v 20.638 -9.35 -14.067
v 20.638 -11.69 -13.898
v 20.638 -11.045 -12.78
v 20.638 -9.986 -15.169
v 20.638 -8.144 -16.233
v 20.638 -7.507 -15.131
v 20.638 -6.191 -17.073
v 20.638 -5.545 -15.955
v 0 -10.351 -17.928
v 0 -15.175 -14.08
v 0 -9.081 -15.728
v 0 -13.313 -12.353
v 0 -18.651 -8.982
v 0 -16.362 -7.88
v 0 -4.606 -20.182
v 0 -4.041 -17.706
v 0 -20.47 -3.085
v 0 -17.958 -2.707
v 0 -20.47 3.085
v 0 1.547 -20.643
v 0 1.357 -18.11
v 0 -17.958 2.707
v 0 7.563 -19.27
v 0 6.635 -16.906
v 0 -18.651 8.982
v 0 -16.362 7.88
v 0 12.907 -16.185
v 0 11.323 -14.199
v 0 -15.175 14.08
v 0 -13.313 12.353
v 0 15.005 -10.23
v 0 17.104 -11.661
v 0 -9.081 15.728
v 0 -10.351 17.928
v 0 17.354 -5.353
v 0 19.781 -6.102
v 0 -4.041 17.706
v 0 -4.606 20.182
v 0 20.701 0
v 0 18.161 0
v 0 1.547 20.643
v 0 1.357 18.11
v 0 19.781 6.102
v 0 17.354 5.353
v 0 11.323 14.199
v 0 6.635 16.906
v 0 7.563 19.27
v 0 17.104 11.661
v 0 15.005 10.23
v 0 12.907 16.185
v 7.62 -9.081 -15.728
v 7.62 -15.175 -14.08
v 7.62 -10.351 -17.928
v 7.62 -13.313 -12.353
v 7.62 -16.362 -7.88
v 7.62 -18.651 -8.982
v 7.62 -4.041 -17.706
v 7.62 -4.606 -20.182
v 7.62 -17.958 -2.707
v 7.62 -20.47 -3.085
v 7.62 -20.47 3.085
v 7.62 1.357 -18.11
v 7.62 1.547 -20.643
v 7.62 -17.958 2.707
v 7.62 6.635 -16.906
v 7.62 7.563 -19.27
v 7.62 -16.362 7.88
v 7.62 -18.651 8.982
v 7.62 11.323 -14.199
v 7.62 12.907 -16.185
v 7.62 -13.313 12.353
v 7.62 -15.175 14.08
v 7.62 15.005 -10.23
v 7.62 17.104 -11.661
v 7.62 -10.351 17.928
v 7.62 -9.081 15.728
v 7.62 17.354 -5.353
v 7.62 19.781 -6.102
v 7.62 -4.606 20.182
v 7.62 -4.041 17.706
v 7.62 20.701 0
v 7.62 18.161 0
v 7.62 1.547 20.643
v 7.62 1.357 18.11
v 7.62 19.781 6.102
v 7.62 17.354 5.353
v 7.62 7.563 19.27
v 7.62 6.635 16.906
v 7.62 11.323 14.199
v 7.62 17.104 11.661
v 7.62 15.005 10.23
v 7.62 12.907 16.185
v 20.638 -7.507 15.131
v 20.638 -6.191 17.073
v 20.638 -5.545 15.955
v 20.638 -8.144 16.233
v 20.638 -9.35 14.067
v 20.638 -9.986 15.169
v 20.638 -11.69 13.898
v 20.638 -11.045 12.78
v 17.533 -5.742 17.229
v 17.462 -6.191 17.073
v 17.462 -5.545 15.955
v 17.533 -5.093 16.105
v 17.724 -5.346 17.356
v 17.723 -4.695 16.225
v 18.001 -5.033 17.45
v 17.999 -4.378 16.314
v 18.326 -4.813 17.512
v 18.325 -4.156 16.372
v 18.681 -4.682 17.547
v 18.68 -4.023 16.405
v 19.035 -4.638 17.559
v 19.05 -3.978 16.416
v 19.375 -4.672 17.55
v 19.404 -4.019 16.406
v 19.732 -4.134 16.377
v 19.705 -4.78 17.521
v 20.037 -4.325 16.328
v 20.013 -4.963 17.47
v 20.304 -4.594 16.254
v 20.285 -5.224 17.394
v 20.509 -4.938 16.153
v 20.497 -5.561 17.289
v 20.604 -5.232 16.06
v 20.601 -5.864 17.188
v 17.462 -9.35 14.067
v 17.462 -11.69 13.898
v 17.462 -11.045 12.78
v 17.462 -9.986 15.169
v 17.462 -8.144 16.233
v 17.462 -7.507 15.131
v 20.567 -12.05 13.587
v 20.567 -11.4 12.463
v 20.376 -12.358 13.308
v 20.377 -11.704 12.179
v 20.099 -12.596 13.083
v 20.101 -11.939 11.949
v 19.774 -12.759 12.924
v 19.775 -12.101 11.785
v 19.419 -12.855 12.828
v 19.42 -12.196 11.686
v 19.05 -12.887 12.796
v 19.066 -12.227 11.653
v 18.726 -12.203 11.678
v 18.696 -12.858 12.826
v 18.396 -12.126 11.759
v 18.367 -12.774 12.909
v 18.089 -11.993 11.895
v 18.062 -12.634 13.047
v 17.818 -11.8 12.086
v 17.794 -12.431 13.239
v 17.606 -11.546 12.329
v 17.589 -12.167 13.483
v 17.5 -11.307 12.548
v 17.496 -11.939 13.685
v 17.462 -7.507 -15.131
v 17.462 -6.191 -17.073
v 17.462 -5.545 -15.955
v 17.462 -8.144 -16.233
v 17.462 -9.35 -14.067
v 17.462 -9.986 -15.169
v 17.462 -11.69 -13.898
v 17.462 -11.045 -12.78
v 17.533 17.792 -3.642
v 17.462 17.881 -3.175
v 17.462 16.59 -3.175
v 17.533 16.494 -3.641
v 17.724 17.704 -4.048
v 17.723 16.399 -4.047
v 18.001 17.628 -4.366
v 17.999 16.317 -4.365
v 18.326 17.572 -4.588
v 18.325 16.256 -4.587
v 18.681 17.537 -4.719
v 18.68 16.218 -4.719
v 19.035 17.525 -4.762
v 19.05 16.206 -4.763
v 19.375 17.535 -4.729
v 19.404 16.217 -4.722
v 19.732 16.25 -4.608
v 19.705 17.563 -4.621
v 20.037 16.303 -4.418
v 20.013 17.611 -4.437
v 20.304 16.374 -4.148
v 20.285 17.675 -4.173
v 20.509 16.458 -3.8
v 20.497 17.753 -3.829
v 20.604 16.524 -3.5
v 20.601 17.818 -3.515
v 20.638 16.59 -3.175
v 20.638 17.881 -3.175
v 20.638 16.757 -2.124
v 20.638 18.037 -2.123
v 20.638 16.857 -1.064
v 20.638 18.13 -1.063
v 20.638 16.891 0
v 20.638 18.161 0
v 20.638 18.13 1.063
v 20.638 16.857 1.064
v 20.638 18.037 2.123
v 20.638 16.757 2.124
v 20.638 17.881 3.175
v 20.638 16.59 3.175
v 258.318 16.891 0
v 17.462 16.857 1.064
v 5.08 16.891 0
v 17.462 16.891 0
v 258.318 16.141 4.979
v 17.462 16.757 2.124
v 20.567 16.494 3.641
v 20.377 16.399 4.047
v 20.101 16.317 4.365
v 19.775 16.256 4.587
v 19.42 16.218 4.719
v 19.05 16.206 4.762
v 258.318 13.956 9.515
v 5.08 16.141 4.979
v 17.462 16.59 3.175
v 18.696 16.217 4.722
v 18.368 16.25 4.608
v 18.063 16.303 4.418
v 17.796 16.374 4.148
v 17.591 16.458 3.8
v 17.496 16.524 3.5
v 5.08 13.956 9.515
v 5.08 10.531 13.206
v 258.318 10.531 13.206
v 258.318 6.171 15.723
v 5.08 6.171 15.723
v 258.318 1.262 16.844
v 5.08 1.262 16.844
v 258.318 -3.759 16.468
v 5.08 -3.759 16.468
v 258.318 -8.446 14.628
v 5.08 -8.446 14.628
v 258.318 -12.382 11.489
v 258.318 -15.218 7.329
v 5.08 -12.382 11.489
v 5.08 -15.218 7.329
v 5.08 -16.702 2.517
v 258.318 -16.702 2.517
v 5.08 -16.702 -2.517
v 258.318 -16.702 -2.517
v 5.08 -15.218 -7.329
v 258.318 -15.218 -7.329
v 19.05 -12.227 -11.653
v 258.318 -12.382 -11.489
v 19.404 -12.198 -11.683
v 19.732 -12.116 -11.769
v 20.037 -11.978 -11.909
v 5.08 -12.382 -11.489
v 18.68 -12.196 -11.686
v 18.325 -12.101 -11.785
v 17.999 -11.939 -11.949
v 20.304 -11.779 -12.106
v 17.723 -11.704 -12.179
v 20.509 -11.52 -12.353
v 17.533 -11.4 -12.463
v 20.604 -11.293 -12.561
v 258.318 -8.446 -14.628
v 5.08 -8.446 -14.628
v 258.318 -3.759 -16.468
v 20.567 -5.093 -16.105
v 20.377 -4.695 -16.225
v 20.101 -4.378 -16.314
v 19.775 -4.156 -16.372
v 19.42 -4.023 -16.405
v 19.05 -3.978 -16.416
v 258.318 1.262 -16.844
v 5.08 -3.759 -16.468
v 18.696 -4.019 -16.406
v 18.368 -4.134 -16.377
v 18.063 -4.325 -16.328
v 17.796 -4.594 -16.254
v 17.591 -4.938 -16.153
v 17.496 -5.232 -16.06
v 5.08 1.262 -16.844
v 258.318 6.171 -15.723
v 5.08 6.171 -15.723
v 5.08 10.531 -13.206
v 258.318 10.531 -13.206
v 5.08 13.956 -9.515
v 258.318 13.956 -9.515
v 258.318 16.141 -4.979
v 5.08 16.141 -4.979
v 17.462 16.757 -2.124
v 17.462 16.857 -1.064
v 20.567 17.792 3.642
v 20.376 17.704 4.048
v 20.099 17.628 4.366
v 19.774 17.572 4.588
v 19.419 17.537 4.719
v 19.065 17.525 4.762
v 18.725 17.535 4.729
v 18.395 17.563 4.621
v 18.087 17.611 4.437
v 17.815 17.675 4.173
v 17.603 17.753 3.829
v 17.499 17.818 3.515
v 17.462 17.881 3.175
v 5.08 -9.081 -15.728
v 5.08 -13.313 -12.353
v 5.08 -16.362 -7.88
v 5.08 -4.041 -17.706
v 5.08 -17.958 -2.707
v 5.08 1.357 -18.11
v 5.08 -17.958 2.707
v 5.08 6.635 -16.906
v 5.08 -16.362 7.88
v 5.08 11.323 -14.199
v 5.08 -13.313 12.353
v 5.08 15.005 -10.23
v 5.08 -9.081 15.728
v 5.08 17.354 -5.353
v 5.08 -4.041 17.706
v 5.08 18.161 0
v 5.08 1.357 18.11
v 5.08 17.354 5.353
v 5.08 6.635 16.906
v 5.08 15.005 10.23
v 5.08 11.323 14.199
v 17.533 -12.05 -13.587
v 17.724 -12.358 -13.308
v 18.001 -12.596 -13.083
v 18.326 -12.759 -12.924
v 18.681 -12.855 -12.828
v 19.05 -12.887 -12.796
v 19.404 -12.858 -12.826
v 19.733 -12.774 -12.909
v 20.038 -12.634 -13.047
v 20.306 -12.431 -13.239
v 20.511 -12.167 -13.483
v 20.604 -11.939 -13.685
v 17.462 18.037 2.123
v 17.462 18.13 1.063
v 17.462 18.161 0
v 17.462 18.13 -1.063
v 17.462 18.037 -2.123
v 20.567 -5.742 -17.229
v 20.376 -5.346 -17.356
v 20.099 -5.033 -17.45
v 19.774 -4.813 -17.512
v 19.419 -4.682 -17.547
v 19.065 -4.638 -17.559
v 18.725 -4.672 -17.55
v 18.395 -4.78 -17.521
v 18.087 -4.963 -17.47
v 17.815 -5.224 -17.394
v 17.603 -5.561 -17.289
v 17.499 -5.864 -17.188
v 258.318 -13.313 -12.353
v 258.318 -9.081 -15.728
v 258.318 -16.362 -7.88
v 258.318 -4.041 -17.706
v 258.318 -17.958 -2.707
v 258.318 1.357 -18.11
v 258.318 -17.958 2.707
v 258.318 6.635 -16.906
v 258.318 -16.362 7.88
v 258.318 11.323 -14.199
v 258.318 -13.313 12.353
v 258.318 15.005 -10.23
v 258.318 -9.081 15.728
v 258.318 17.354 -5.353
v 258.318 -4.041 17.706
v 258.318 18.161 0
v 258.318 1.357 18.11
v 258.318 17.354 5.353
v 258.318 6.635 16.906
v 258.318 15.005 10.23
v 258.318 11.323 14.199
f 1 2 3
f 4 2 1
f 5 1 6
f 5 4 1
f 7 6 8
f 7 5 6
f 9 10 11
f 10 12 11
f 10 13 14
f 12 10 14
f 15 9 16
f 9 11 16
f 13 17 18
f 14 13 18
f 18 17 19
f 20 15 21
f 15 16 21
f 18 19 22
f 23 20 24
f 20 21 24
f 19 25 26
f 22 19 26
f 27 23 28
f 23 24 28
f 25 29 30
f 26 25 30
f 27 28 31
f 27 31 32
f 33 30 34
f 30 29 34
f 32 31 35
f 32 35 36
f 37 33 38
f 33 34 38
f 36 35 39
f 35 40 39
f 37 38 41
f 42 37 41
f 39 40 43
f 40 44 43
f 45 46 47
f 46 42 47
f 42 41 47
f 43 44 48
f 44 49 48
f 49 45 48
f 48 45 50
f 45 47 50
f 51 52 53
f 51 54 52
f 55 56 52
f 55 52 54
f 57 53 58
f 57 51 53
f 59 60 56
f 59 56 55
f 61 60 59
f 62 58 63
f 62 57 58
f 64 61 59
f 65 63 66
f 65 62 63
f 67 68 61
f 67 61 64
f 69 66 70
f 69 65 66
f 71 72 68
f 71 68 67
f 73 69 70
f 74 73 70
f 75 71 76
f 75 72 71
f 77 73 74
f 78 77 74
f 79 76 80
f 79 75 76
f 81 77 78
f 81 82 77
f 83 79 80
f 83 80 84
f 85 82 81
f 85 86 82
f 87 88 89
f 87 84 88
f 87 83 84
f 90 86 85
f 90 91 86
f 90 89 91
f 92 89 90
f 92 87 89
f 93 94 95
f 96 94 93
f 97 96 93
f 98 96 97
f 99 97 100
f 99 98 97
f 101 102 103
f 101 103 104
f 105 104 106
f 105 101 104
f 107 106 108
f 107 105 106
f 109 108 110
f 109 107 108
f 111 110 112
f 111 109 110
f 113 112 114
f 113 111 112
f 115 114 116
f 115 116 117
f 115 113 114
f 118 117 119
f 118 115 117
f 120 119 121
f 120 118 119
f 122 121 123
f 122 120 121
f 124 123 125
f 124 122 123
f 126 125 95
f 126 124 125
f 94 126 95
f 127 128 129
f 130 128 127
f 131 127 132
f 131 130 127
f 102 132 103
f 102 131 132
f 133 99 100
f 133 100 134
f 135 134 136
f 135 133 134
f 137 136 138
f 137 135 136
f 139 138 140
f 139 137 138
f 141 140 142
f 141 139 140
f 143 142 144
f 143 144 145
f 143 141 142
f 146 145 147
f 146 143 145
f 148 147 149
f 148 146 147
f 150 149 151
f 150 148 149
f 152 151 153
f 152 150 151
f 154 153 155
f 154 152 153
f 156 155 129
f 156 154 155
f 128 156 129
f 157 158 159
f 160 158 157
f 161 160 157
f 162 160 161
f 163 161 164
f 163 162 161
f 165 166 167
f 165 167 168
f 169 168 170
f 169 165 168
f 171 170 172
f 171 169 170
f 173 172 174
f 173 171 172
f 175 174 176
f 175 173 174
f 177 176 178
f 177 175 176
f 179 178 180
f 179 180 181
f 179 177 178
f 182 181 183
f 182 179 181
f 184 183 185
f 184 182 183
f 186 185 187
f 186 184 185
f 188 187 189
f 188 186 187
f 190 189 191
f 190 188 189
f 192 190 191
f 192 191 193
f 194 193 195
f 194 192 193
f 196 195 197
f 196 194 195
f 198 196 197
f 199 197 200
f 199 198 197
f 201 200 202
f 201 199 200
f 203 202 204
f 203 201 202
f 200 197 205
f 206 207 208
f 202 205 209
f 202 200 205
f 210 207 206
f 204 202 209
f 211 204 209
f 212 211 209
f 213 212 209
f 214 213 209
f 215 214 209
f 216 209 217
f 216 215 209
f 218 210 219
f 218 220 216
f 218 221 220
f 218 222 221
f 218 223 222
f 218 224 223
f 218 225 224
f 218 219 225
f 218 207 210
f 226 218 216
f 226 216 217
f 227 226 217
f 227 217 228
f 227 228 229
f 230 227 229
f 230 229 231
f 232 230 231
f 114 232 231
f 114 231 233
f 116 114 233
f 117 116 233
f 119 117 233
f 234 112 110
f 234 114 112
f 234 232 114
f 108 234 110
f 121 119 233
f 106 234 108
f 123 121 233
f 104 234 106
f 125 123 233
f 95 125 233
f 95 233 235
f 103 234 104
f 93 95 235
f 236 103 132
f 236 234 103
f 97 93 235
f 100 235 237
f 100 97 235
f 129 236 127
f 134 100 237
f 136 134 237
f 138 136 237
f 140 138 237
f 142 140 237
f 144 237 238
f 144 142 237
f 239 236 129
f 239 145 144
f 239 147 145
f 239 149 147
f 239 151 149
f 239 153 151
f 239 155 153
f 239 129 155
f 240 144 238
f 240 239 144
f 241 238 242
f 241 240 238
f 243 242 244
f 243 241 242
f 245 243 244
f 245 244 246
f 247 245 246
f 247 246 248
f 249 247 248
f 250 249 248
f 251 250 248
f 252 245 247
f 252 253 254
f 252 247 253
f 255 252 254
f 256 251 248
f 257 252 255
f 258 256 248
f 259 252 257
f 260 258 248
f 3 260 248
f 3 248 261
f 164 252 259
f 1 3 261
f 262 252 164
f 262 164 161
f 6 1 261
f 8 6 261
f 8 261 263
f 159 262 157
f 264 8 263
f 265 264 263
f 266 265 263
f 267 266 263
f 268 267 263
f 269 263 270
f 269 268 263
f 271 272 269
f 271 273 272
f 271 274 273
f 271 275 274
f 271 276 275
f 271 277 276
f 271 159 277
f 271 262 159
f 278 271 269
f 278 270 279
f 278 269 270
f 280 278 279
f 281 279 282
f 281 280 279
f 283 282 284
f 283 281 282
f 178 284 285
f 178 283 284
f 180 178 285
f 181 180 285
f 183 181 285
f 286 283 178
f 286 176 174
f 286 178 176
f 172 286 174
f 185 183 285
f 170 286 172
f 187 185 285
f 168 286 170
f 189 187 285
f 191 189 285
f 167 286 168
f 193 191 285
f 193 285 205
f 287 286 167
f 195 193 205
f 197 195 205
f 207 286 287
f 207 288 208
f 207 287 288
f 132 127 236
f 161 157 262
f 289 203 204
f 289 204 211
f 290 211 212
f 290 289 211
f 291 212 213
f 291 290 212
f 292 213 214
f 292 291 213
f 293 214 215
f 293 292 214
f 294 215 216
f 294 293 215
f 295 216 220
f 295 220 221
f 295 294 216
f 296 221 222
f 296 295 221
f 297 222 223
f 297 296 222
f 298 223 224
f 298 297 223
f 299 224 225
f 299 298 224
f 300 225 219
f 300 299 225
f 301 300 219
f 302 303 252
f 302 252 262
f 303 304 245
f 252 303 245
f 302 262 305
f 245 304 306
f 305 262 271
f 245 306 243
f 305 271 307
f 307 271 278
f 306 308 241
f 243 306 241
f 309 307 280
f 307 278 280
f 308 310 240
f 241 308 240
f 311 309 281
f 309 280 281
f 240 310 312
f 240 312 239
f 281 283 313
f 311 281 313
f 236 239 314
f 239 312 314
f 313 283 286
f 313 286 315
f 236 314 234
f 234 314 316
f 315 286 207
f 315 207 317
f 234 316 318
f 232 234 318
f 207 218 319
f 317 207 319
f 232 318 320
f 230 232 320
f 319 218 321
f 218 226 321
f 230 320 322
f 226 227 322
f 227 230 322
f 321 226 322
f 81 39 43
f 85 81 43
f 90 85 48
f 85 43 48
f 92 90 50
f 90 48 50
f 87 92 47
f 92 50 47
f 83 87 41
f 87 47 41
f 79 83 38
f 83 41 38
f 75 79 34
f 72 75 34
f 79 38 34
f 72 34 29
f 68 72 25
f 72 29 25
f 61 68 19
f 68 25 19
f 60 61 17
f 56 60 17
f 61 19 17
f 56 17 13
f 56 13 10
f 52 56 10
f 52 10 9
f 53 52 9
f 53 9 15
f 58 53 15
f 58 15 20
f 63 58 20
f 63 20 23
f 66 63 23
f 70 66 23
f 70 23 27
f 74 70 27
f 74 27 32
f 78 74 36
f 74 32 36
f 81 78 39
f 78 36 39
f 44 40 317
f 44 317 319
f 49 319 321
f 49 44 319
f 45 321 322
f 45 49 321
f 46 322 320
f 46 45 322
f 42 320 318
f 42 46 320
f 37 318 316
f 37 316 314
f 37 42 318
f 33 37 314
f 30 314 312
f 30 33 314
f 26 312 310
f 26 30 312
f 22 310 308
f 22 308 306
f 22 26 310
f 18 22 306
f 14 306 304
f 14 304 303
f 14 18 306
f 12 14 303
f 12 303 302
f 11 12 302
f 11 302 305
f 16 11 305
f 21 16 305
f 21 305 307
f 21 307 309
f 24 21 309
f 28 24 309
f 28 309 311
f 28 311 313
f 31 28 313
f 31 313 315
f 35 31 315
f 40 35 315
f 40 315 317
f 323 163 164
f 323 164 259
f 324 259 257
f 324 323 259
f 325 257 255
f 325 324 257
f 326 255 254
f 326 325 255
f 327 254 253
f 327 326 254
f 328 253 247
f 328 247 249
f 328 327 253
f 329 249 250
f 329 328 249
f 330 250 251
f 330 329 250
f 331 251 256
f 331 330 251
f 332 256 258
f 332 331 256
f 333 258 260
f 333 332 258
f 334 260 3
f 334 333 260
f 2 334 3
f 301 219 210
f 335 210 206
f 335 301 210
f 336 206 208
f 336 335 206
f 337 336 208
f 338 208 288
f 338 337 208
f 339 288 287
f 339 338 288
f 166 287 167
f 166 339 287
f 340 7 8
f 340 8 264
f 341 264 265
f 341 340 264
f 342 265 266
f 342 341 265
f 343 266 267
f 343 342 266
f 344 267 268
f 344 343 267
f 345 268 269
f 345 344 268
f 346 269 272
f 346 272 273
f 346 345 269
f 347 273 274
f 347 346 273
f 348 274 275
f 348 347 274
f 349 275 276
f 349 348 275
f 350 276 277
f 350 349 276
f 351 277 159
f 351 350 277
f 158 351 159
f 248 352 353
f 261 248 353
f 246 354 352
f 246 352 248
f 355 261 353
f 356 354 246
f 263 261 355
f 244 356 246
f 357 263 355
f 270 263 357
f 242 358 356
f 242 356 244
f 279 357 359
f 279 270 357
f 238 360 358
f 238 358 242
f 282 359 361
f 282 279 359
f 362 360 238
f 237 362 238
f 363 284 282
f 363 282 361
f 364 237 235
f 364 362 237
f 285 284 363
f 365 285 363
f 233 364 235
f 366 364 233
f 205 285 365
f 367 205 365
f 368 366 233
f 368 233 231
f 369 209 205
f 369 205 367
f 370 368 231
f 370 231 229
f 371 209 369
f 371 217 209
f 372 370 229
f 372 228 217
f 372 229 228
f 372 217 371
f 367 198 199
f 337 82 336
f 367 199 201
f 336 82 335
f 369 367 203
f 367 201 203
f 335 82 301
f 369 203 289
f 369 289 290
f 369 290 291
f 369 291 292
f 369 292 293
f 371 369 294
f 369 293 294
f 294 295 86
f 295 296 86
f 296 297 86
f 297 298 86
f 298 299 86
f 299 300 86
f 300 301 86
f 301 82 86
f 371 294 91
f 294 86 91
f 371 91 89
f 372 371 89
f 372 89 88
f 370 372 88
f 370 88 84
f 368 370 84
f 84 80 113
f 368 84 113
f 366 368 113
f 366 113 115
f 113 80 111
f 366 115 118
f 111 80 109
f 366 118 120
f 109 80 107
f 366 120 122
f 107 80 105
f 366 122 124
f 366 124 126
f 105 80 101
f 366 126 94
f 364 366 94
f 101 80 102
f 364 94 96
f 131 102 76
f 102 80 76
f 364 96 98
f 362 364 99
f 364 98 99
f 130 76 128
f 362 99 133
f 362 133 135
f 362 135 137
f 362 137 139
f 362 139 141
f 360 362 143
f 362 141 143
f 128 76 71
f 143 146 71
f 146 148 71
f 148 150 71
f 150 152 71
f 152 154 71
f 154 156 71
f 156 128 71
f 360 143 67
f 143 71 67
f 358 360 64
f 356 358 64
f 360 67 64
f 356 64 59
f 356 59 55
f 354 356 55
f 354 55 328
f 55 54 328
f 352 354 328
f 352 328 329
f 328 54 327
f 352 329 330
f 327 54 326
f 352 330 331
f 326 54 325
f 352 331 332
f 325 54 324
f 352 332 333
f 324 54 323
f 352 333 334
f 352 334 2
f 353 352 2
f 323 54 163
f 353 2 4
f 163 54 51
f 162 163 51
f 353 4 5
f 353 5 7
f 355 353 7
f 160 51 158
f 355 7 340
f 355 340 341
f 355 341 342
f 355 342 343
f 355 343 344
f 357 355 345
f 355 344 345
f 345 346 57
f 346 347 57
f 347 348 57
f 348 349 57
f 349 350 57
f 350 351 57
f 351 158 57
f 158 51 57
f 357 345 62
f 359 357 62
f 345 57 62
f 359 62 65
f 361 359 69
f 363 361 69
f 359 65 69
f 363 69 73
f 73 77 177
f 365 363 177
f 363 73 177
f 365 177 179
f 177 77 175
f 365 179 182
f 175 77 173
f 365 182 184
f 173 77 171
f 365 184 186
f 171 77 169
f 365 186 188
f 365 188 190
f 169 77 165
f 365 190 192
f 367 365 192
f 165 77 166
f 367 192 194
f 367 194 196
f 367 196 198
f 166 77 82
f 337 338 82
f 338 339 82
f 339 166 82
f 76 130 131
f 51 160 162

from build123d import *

# Parameters (mm, degrees)
REVOLVE1_START         = 5.08
REVOLVE1_OUTLINE_R     = 18.161
REVOLVE1_OUTLINE_R_2   = 16.891
REVOLVE1_DEPTH         = 253.238
REVOLVE1_2_OUTLINE_R   = 20.701
REVOLVE1_2_OUTLINE_R_2 = 18.161
REVOLVE1_2_DEPTH       = 7.62
CUT_EXTRUDE1_DEPTH     = 5.08
CIRPATTERN1_COUNT      = 3


# Read off the part's stored shape, not the designer's step: Revolve1
with BuildPart() as part:
    # Revolve1 outline → Revolve1 (new body)
    with BuildSketch(Plane.YZ.offset(REVOLVE1_START)):
        Circle(REVOLVE1_OUTLINE_R)
        Circle(REVOLVE1_OUTLINE_R_2, mode=Mode.SUBTRACT)
    extrude(amount=REVOLVE1_DEPTH)

    # Revolve1 2 outline → Revolve1 2 (add)
    with BuildSketch(Plane.YZ):
        Circle(REVOLVE1_2_OUTLINE_R)
        Circle(REVOLVE1_2_OUTLINE_R_2, mode=Mode.SUBTRACT)
    extrude(amount=REVOLVE1_2_DEPTH)

    # Sketch2 → Cut-Extrude1 (cut)
    with BuildSketch(Plane(origin=(0, 18.161, 0), x_dir=(1, 0, 0), z_dir=(0, 1, 0))):
        with BuildLine():
            Line((20.6375, 3.175), (20.6375, -3.175))
            ThreePointArc((20.6375, -3.175), (19.05, -4.7625), (17.4625, -3.175))
            Line((17.4625, -3.175), (17.4625, 3.175))
            ThreePointArc((17.4625, 3.175), (19.05, 4.7625), (20.6375, 3.175))
        make_face()
    cut_extrude1 = extrude(amount=-CUT_EXTRUDE1_DEPTH, mode=Mode.SUBTRACT)

    # CirPattern1: Cut-Extrude1 ×3 about axis
    cirpattern1_axis = Axis((0, 0, 0), (-1, 0, 0))
    for i in range(1, CIRPATTERN1_COUNT):
        add(cut_extrude1.rotate(cirpattern1_axis, i * 360 / CIRPATTERN1_COUNT), mode=Mode.SUBTRACT)


solid = part.part
